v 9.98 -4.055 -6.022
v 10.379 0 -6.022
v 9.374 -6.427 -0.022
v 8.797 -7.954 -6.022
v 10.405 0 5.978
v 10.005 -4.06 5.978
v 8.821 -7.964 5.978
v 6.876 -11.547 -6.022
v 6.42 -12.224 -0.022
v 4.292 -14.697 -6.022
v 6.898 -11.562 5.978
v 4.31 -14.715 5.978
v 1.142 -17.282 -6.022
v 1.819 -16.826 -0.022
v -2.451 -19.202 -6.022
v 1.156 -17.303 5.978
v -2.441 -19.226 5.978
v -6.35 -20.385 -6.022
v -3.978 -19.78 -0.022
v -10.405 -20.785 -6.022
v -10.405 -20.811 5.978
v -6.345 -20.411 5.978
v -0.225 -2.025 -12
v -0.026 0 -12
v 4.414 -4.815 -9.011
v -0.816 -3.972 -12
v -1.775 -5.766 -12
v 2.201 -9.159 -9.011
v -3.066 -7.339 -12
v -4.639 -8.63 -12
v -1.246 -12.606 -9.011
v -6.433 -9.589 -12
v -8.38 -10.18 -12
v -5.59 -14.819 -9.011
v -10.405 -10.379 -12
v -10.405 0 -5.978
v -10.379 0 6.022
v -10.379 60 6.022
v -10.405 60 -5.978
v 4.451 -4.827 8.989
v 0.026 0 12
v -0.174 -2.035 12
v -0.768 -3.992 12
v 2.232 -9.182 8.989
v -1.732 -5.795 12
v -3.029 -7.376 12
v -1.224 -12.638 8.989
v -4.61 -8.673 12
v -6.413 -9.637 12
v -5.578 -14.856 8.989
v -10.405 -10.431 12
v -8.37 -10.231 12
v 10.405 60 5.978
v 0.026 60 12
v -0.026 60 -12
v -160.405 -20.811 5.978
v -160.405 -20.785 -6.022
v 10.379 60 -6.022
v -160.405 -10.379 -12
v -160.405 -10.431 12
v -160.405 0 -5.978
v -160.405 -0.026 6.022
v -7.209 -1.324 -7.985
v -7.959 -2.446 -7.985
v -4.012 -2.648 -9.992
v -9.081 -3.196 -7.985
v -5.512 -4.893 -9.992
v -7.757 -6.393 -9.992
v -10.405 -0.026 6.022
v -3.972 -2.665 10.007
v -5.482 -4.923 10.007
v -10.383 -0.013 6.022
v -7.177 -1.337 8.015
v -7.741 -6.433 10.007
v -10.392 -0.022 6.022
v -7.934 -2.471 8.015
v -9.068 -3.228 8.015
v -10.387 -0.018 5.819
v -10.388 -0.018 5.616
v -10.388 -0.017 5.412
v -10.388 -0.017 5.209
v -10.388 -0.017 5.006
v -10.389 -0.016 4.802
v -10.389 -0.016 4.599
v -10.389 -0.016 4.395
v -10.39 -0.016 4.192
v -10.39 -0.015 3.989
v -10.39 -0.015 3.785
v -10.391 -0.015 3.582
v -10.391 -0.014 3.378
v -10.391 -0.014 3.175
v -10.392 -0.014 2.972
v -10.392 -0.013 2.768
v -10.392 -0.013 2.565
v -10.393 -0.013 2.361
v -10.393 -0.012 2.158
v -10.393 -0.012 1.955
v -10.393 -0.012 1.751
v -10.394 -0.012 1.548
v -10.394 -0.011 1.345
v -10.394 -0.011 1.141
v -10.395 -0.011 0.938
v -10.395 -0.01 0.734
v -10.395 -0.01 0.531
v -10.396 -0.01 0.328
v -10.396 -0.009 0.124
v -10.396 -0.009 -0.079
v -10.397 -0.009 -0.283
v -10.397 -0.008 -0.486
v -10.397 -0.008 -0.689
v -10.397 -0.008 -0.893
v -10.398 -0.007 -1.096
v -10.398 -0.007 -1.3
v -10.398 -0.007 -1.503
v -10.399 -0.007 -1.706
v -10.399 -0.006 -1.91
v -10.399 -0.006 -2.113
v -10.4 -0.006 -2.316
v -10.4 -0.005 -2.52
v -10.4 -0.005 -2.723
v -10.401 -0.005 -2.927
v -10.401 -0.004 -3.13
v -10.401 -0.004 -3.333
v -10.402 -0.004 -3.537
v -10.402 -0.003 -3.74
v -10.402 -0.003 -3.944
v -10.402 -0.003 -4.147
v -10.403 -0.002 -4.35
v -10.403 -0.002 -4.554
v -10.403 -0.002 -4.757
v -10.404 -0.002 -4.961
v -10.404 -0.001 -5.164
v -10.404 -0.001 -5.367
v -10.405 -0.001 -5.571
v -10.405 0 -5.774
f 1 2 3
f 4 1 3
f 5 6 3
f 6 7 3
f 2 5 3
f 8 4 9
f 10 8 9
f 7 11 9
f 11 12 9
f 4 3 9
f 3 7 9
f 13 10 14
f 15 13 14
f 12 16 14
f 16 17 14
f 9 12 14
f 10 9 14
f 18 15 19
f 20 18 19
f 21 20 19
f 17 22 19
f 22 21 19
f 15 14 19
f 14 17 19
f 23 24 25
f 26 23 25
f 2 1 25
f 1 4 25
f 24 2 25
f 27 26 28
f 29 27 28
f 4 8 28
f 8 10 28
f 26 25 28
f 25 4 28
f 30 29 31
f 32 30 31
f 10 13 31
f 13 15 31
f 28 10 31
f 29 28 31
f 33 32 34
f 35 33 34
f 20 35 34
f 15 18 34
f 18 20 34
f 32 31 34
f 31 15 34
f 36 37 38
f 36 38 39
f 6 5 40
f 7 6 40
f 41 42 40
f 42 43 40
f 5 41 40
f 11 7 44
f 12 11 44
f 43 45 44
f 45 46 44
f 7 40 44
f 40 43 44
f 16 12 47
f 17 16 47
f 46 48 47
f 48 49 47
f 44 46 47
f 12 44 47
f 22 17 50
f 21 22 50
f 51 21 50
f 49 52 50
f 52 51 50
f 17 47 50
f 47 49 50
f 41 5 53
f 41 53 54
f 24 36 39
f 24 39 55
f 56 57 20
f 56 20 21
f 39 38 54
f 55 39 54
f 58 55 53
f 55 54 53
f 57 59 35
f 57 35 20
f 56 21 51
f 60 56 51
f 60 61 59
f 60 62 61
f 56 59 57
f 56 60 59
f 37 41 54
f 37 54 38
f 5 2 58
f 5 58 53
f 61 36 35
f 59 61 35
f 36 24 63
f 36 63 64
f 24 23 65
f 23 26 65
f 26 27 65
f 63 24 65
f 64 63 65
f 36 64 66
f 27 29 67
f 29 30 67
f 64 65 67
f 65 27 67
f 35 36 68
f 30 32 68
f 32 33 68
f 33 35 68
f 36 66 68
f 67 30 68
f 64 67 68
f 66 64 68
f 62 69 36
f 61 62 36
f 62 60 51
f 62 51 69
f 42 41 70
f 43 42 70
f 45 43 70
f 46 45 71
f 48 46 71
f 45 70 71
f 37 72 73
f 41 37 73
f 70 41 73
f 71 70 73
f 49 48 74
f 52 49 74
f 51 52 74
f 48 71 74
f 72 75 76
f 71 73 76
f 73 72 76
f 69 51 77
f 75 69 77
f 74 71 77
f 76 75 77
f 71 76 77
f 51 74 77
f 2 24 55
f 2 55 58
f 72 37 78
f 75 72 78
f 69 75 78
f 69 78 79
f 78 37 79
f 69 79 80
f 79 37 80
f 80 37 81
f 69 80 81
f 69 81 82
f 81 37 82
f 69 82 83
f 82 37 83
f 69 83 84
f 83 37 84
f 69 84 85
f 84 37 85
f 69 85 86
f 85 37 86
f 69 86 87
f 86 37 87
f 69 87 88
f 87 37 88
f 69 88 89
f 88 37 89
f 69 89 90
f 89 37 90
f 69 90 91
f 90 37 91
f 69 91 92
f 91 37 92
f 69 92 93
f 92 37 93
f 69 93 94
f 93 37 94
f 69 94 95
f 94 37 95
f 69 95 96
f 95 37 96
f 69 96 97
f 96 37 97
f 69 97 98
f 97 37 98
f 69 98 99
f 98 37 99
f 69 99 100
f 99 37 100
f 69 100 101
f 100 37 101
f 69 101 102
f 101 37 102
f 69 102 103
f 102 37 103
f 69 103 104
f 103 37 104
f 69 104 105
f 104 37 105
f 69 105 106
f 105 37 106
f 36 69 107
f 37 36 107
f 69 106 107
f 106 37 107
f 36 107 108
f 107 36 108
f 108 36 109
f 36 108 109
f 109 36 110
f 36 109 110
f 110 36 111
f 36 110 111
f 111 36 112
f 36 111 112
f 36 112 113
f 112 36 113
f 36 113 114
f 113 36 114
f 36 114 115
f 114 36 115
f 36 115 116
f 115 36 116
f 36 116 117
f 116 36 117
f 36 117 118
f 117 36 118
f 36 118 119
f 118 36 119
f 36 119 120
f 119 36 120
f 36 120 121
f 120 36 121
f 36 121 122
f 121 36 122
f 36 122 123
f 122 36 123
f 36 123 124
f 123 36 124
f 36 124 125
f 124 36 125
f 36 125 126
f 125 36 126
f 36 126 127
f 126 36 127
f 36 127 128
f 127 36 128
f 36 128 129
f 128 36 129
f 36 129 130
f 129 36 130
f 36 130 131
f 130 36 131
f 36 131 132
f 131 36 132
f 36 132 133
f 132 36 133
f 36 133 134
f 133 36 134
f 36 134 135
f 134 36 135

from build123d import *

# Parameters (mm, degrees)
F1_ANGLE = 90
F2_DEPTH = 60
F4_DEPTH = 150


with BuildPart() as f1:
    # F0 (on Front) → F1 (revolve)
    with BuildSketch(Plane.XZ):
        Polygon((-0.0259582262, -11.9999719237), (10.3793014176, -6.0224664452), (10.4052596438, 5.9775054785), (0.0259582262, 11.9999719237), (-10.3793014176, 6.0224664452), (-10.4052596438, -5.9775054785), align=None)
    revolve(axis=Axis((-10.4052596438, 0, 8.529782465), (0, 0, -1)), revolution_arc=F1_ANGLE)

    # F0 (on Front) → F2 (join)
    with BuildSketch(Plane.XZ):
        Polygon((-0.0259582262, -11.9999719237), (10.3793014176, -6.0224664452), (10.4052596438, 5.9775054785), (0.0259582262, 11.9999719237), (-10.3793014176, 6.0224664452), (-10.4052596438, -5.9775054785), align=None)
    extrude(amount=-F2_DEPTH)

    # F3 (on face) → F4 (join)
    with BuildSketch(Plane(origin=(-10.4052596438, 0, 0), x_dir=(0, -1, 0), z_dir=(-1, 0, 0))):
        Polygon((0, -5.9775054785), (10.3793014176, -11.9999719237), (20.7845610613, -6.0224664452), (20.8105192875, 5.9775054785), (10.43121787, 11.9999719237), (0.0259582262, 6.0224664452), align=None)
    extrude(amount=F4_DEPTH)


solid = f1.part
